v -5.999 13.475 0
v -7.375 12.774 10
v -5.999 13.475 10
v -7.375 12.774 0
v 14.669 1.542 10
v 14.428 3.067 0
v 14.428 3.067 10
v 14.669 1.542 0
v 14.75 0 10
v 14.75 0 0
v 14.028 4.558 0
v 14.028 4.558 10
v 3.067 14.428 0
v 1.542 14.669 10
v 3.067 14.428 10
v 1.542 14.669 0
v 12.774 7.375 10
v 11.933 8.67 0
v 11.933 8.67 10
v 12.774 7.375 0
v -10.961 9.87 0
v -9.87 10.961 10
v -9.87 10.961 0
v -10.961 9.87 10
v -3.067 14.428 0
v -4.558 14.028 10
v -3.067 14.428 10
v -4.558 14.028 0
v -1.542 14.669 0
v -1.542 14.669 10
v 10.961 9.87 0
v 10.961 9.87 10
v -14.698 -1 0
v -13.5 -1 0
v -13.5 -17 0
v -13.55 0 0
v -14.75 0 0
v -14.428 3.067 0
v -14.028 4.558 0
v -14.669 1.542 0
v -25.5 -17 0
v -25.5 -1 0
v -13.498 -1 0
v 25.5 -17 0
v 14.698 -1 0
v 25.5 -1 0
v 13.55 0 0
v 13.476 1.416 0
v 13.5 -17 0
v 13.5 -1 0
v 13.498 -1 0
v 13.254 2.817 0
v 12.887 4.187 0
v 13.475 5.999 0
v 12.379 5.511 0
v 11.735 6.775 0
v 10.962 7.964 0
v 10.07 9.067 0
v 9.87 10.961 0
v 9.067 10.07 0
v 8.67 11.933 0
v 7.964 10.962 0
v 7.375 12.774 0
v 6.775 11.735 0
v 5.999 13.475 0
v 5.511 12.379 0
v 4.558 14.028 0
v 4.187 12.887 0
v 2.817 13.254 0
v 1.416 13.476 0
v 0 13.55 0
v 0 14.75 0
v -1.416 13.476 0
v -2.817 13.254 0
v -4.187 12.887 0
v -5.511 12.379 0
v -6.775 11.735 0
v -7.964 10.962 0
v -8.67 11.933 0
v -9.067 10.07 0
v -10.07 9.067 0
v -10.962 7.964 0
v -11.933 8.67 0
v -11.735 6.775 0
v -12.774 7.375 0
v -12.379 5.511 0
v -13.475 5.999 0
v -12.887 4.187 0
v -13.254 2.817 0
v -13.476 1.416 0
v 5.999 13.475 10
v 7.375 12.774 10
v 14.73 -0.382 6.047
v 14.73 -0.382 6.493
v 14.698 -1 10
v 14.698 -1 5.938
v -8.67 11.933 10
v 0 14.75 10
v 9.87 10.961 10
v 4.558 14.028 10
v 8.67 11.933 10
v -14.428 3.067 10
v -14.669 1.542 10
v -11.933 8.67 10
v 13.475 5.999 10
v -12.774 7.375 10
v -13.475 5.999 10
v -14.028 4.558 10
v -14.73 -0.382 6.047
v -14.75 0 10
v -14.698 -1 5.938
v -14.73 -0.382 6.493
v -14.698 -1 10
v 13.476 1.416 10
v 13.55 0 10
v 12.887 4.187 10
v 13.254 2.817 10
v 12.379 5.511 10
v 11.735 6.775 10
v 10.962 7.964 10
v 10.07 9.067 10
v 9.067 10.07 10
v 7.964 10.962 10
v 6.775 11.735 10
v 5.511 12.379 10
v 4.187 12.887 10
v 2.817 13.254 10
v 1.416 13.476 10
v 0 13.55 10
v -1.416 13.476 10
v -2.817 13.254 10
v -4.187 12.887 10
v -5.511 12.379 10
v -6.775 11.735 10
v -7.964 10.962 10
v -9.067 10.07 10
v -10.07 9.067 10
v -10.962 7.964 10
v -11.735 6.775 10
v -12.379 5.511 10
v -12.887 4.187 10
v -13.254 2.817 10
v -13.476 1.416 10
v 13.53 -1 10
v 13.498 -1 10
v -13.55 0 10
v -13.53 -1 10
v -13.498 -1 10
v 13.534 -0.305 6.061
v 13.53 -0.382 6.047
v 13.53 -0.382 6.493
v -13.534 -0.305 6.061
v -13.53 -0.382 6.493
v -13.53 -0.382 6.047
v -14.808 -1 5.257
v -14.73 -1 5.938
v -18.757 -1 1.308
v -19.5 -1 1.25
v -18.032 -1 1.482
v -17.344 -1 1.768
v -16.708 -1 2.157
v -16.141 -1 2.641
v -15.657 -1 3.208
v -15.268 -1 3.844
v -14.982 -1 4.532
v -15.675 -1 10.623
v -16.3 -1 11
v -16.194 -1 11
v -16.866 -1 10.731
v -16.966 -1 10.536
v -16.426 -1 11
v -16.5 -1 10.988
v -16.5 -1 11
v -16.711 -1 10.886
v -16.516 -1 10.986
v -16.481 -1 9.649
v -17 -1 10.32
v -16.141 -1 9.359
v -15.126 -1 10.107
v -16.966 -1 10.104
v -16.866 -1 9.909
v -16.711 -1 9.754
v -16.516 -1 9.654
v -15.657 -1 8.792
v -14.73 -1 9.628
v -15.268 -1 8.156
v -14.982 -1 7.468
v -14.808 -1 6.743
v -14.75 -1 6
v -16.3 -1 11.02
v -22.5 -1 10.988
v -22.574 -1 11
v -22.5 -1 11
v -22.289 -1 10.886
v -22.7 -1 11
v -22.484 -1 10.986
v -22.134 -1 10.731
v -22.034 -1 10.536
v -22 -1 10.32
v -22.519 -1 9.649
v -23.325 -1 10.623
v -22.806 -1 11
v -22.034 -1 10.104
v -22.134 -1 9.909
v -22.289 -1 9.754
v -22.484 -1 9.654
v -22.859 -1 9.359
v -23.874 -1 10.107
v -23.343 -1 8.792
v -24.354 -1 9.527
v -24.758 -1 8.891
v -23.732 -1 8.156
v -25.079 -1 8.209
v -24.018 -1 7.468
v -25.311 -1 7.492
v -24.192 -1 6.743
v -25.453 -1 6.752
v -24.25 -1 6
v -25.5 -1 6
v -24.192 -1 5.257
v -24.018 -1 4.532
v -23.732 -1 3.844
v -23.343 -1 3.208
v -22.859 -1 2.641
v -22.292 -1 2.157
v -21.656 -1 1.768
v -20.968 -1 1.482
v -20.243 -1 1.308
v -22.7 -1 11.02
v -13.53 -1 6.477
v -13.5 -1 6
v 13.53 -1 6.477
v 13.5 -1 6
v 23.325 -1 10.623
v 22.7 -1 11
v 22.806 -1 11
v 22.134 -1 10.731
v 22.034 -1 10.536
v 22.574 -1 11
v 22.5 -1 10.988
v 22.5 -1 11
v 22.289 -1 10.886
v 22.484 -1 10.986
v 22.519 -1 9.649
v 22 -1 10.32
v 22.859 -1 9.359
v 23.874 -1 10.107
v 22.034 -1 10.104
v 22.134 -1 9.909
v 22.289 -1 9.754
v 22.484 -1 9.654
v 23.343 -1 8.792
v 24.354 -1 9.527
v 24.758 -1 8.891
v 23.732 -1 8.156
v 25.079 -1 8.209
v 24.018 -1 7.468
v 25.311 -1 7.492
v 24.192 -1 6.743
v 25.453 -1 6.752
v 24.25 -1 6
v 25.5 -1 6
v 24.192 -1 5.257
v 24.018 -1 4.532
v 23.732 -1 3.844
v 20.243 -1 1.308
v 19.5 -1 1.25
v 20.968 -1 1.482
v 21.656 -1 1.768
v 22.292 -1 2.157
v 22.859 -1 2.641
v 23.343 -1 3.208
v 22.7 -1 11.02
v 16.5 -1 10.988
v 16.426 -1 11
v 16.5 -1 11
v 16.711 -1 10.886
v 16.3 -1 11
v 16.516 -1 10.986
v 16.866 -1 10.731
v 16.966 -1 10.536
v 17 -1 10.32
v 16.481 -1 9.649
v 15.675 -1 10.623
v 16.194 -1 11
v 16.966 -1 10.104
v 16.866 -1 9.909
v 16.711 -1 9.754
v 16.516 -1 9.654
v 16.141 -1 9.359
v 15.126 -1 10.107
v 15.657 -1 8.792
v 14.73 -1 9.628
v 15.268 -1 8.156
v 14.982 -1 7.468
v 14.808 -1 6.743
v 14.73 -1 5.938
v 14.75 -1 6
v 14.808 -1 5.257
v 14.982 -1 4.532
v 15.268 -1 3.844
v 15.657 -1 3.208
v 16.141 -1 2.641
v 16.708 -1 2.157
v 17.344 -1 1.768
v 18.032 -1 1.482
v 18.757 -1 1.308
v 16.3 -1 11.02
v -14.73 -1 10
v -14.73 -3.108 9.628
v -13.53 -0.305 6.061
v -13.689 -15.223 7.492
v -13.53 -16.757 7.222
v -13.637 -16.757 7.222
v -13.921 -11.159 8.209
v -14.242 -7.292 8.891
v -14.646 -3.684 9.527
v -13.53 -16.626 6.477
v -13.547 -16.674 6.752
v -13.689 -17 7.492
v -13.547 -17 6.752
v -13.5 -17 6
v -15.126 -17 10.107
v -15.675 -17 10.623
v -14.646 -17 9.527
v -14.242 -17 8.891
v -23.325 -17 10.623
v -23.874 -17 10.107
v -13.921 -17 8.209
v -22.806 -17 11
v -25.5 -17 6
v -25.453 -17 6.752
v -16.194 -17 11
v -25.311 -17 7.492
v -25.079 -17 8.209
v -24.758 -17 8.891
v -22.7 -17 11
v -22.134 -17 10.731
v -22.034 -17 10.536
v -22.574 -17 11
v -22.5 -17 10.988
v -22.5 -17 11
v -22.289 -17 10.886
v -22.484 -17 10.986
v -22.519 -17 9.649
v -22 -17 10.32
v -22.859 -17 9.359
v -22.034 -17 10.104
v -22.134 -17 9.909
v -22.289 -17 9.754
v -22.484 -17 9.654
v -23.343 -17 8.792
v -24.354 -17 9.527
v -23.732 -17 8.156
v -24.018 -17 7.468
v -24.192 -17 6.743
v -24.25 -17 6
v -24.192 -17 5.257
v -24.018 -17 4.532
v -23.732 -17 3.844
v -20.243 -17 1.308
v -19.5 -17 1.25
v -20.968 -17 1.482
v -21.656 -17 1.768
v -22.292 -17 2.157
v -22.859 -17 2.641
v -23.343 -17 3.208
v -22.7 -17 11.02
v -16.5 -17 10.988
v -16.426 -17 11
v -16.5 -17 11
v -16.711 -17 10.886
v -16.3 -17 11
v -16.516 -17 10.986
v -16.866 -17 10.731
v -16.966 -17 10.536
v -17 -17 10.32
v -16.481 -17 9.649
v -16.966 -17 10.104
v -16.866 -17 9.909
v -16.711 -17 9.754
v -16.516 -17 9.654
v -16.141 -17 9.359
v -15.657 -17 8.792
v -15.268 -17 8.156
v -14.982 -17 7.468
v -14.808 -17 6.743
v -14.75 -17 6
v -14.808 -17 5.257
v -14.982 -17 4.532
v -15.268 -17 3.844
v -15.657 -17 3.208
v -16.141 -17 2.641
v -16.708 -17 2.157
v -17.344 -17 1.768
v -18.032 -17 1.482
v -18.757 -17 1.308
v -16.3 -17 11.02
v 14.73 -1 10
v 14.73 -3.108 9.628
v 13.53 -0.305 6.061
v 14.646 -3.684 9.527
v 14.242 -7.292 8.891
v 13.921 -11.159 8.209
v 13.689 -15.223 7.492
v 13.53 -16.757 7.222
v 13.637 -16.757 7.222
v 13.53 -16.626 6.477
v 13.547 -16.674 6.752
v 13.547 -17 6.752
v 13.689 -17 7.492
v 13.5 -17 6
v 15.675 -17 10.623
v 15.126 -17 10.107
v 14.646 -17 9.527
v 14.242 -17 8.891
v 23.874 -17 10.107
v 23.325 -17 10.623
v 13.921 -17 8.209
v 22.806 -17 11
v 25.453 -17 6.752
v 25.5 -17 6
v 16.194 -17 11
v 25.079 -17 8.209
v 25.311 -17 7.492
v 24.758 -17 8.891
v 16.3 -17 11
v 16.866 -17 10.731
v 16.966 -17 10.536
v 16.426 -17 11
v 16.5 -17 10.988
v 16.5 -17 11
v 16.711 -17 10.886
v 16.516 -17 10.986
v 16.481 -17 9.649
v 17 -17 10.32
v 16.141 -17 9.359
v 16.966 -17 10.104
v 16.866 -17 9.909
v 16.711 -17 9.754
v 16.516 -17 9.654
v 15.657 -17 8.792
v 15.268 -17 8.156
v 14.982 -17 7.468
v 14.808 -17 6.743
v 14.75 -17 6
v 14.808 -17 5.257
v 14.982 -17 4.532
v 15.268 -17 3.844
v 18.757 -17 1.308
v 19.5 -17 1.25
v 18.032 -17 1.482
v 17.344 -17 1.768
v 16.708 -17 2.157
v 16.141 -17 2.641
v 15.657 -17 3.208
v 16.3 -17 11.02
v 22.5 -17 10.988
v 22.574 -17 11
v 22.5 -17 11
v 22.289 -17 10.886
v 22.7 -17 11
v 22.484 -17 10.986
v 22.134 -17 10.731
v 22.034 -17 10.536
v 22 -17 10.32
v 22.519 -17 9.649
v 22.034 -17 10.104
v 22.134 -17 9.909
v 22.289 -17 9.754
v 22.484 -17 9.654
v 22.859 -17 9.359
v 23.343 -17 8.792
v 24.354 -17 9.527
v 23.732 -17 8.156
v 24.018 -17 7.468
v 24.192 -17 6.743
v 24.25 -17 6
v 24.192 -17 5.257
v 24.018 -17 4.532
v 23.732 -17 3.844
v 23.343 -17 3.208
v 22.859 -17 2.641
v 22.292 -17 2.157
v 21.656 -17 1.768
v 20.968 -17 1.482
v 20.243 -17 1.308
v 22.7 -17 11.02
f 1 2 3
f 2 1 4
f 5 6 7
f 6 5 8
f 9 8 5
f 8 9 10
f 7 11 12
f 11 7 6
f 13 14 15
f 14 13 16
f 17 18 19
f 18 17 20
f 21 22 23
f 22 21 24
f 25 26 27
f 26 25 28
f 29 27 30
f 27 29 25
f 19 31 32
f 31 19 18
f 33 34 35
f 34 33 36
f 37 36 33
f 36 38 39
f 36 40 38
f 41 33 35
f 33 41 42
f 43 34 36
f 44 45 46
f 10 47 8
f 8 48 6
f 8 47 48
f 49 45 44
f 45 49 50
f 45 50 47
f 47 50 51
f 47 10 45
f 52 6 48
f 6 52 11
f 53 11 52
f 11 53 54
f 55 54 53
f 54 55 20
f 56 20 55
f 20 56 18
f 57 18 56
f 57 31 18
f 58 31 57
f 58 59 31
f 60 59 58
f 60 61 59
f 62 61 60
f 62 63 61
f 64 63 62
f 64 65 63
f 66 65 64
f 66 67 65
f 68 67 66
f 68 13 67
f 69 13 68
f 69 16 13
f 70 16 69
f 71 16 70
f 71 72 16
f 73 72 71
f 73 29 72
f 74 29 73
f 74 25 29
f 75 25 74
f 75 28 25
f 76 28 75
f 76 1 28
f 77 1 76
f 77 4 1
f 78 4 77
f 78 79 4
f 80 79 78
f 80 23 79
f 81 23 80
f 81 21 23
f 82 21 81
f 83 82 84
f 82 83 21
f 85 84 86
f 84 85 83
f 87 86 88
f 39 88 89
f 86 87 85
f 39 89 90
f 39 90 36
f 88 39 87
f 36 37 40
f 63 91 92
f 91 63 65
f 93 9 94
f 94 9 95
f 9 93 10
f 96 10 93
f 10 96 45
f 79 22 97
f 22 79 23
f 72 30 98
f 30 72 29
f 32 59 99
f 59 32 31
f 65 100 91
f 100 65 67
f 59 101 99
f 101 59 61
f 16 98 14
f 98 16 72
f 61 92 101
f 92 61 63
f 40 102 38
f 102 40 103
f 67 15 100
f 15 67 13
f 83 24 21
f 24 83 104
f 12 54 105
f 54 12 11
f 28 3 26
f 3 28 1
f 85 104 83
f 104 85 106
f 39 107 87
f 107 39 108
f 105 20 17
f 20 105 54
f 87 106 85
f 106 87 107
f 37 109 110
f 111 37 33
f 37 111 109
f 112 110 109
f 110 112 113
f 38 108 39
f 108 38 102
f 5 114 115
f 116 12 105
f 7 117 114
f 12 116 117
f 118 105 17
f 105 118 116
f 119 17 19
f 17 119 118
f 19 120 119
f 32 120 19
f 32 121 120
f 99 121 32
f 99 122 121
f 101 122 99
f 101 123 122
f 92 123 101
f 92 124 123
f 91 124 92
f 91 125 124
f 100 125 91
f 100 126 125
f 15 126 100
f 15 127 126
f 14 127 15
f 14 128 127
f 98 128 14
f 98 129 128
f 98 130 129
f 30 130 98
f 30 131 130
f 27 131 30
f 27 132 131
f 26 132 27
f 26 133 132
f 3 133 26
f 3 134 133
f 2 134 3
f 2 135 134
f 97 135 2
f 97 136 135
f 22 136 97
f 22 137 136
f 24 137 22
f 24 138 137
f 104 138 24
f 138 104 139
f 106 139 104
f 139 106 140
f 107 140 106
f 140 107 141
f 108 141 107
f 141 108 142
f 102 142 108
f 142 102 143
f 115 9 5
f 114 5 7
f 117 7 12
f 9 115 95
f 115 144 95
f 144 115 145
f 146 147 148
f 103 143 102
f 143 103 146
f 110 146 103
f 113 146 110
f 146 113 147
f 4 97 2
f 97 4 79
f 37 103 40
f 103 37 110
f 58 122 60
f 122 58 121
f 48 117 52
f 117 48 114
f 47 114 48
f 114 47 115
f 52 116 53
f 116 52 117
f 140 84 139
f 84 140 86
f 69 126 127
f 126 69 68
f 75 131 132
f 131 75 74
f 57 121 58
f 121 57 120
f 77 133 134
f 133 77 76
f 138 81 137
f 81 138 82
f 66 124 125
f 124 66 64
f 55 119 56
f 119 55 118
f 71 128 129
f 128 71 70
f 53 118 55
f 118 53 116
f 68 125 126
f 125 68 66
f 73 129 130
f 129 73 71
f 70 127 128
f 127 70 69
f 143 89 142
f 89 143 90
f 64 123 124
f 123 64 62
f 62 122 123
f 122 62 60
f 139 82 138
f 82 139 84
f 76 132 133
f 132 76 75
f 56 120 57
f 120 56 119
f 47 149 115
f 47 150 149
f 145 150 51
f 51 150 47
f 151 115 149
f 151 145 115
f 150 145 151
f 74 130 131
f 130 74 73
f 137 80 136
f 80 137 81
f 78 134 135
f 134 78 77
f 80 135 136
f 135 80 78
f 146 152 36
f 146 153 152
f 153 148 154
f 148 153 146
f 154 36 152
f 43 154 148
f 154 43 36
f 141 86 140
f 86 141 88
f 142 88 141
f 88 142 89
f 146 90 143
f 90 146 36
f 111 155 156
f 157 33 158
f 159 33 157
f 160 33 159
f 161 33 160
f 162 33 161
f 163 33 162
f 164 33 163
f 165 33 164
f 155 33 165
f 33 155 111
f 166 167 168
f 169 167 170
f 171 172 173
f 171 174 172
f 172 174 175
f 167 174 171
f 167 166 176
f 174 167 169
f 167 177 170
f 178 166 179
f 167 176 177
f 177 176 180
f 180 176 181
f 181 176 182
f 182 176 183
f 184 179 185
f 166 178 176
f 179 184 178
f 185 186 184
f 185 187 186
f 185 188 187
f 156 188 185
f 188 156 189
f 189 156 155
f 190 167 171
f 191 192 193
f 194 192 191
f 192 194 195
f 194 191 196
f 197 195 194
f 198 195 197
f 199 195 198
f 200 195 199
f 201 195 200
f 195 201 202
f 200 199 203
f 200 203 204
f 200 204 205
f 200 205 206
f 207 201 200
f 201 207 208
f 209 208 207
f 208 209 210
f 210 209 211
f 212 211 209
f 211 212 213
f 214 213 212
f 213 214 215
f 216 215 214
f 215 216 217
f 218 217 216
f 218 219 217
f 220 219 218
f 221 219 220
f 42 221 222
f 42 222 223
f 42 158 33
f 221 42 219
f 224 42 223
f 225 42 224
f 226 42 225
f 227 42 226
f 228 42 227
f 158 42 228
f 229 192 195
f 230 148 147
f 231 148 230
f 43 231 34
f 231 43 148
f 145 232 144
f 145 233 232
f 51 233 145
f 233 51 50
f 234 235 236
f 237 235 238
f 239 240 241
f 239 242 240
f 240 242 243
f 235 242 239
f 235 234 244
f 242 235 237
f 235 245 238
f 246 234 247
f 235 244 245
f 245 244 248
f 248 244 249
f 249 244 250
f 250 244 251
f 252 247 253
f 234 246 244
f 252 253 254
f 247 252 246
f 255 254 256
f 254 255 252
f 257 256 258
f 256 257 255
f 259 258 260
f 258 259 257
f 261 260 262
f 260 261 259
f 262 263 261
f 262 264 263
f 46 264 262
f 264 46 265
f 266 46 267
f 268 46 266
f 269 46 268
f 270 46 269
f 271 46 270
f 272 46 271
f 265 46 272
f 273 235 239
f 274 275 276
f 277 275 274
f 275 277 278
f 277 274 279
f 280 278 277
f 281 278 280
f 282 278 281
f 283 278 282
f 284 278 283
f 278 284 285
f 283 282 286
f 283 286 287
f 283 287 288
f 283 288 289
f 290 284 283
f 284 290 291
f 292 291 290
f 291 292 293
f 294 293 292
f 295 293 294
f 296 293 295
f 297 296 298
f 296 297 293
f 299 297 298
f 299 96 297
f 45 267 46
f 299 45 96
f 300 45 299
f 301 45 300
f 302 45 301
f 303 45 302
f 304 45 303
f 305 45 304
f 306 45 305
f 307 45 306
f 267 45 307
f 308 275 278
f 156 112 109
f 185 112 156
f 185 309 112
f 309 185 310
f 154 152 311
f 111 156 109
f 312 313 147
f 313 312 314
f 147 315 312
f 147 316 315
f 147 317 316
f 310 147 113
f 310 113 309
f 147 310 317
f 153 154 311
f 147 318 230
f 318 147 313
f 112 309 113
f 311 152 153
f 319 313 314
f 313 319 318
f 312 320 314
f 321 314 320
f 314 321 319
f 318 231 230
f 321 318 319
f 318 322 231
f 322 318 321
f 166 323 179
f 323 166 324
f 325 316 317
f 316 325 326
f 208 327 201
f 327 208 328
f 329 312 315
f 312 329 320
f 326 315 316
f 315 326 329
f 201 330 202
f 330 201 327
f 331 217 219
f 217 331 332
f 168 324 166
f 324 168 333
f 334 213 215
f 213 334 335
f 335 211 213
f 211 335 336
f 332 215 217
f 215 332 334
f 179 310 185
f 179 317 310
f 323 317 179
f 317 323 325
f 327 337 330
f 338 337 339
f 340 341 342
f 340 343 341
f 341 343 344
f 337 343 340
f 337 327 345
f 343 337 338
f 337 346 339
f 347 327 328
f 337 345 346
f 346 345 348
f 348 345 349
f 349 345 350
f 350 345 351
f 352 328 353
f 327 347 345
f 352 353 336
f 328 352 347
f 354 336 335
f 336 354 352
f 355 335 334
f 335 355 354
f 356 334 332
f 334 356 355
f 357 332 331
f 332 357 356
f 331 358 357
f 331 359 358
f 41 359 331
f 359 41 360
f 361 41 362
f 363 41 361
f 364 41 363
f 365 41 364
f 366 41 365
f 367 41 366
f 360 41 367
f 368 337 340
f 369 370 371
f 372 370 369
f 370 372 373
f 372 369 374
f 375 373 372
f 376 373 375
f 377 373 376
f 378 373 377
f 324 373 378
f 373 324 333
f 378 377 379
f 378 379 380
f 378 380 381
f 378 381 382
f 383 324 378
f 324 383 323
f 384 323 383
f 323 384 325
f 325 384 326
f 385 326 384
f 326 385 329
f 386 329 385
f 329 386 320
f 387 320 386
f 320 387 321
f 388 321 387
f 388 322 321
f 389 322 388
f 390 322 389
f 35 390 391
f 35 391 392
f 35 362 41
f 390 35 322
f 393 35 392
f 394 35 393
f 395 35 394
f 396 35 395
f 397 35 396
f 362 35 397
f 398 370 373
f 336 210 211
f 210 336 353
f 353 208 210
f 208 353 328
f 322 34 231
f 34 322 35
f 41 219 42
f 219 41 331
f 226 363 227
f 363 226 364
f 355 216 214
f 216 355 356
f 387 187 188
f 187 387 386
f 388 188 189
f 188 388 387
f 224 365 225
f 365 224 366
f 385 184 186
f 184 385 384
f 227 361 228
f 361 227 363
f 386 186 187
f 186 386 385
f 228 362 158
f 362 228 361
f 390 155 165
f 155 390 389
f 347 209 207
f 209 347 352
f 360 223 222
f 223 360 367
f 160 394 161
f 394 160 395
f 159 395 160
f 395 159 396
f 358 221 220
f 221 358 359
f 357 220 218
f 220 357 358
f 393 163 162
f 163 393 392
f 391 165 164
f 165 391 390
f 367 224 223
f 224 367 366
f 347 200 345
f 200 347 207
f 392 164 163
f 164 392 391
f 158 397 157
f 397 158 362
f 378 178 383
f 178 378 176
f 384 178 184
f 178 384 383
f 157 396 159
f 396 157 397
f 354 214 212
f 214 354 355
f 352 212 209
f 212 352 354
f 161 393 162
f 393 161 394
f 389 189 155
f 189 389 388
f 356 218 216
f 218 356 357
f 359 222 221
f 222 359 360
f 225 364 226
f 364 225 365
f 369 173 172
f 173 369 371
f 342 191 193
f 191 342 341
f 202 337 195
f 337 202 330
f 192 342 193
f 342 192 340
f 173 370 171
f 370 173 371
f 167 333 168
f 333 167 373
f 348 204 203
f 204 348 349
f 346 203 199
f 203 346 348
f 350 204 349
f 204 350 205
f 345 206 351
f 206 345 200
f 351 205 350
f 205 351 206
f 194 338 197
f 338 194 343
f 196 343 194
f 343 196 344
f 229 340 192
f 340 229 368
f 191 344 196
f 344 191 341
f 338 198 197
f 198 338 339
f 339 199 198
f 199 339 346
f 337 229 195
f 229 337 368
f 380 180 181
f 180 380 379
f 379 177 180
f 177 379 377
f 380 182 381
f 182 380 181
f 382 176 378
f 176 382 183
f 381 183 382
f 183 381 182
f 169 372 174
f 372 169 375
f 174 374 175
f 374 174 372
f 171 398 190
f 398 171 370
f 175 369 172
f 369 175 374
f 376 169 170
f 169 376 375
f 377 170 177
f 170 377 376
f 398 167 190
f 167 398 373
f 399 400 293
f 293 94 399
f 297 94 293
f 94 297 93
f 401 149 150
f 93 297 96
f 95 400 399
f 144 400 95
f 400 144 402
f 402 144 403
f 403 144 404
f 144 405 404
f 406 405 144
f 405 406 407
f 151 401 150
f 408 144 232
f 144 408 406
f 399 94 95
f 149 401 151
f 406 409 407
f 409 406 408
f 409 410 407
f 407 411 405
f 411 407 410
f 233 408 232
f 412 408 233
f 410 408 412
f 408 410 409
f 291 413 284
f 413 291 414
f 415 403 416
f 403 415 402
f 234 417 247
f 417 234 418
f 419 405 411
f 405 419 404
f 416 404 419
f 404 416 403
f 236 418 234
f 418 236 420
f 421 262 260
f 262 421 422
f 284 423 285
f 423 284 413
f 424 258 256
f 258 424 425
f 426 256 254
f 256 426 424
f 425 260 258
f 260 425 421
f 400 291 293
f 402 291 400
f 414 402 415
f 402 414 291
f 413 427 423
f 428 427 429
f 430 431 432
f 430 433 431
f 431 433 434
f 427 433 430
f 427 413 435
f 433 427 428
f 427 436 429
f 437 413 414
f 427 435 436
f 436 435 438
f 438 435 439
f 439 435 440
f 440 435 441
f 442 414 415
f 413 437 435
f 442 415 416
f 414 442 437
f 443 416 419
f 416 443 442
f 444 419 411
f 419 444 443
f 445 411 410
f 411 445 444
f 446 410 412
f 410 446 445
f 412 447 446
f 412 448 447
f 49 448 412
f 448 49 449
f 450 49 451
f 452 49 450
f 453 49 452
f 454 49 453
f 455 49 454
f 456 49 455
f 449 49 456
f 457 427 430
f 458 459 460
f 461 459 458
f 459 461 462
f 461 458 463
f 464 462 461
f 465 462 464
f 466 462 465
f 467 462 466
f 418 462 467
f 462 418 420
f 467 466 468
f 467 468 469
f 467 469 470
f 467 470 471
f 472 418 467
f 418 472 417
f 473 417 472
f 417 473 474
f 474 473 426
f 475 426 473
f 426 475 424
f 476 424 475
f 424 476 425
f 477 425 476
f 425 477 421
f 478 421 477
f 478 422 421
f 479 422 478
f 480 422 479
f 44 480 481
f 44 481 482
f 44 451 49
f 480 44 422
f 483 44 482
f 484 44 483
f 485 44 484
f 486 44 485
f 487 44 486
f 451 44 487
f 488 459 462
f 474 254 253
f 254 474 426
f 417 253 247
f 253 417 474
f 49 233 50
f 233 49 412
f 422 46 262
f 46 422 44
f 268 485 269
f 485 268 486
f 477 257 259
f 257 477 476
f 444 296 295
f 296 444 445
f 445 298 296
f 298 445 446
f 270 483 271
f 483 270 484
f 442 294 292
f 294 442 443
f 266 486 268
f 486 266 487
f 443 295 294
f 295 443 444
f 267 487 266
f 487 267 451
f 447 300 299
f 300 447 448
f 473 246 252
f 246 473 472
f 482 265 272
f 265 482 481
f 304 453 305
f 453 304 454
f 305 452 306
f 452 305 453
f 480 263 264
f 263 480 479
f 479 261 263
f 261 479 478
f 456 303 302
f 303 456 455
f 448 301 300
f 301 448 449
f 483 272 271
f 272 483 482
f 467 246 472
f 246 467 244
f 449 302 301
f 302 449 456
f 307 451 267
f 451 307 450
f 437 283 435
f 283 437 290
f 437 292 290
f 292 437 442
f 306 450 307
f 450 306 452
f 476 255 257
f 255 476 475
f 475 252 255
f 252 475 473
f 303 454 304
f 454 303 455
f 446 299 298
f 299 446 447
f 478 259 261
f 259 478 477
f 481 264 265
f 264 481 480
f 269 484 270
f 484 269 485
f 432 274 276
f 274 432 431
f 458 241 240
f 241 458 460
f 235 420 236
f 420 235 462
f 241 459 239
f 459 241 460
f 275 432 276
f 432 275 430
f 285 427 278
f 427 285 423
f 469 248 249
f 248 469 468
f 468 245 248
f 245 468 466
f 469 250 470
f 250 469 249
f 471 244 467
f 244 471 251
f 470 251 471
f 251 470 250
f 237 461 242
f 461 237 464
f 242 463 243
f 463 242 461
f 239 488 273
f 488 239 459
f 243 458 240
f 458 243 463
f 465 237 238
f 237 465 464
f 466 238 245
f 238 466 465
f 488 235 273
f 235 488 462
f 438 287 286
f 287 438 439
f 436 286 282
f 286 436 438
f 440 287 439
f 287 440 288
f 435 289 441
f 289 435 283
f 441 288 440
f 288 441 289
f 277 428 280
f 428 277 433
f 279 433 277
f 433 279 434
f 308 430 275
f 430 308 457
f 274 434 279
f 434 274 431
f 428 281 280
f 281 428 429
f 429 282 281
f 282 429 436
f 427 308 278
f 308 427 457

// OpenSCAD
difference(){
  cylinder(d=29.5,h=10,$fn=60);
  translate([0,0,-.01]) cylinder(d=27.1,h=12.02,$fn=60);
  translate([-16,-16,-.01]) cube([32,15,12.02]);
}
for(m=[0,1]) mirror([m,0])
translate([-19.5,-1,6]) {
  difference(){
    union(){
      translate([4.5,-4,0]) translate([1.47,4,4]) rotate([10,0]) mirror([1,0]) mirror([0,1]) mirror([0,0,1]) cube([1.2,16,4]);
      rotate([90,0]) cylinder(d=12,h=16,$fn=50);
      translate([-6,-16,-6]) cube([12,16,6]);
    }
    translate([0,.01]) rotate([90,0]) cylinder(d=9.5,h=16.02,$fn=40);
    translate([-3,-16.01,3])
      cube([6,16.02,3]);
    translate([-5,-16.01,5]) cube([10,16.02,3]);
  }
  for(f=[0,1]) mirror([f,0])
  translate([-3.2,-16,4.32]) intersection(){
    rotate([-90,0]) cylinder(d=1.4,h=16.03,$fn=20);
    translate([0,0,-2]) cube([2,16,4]);
  }

}
